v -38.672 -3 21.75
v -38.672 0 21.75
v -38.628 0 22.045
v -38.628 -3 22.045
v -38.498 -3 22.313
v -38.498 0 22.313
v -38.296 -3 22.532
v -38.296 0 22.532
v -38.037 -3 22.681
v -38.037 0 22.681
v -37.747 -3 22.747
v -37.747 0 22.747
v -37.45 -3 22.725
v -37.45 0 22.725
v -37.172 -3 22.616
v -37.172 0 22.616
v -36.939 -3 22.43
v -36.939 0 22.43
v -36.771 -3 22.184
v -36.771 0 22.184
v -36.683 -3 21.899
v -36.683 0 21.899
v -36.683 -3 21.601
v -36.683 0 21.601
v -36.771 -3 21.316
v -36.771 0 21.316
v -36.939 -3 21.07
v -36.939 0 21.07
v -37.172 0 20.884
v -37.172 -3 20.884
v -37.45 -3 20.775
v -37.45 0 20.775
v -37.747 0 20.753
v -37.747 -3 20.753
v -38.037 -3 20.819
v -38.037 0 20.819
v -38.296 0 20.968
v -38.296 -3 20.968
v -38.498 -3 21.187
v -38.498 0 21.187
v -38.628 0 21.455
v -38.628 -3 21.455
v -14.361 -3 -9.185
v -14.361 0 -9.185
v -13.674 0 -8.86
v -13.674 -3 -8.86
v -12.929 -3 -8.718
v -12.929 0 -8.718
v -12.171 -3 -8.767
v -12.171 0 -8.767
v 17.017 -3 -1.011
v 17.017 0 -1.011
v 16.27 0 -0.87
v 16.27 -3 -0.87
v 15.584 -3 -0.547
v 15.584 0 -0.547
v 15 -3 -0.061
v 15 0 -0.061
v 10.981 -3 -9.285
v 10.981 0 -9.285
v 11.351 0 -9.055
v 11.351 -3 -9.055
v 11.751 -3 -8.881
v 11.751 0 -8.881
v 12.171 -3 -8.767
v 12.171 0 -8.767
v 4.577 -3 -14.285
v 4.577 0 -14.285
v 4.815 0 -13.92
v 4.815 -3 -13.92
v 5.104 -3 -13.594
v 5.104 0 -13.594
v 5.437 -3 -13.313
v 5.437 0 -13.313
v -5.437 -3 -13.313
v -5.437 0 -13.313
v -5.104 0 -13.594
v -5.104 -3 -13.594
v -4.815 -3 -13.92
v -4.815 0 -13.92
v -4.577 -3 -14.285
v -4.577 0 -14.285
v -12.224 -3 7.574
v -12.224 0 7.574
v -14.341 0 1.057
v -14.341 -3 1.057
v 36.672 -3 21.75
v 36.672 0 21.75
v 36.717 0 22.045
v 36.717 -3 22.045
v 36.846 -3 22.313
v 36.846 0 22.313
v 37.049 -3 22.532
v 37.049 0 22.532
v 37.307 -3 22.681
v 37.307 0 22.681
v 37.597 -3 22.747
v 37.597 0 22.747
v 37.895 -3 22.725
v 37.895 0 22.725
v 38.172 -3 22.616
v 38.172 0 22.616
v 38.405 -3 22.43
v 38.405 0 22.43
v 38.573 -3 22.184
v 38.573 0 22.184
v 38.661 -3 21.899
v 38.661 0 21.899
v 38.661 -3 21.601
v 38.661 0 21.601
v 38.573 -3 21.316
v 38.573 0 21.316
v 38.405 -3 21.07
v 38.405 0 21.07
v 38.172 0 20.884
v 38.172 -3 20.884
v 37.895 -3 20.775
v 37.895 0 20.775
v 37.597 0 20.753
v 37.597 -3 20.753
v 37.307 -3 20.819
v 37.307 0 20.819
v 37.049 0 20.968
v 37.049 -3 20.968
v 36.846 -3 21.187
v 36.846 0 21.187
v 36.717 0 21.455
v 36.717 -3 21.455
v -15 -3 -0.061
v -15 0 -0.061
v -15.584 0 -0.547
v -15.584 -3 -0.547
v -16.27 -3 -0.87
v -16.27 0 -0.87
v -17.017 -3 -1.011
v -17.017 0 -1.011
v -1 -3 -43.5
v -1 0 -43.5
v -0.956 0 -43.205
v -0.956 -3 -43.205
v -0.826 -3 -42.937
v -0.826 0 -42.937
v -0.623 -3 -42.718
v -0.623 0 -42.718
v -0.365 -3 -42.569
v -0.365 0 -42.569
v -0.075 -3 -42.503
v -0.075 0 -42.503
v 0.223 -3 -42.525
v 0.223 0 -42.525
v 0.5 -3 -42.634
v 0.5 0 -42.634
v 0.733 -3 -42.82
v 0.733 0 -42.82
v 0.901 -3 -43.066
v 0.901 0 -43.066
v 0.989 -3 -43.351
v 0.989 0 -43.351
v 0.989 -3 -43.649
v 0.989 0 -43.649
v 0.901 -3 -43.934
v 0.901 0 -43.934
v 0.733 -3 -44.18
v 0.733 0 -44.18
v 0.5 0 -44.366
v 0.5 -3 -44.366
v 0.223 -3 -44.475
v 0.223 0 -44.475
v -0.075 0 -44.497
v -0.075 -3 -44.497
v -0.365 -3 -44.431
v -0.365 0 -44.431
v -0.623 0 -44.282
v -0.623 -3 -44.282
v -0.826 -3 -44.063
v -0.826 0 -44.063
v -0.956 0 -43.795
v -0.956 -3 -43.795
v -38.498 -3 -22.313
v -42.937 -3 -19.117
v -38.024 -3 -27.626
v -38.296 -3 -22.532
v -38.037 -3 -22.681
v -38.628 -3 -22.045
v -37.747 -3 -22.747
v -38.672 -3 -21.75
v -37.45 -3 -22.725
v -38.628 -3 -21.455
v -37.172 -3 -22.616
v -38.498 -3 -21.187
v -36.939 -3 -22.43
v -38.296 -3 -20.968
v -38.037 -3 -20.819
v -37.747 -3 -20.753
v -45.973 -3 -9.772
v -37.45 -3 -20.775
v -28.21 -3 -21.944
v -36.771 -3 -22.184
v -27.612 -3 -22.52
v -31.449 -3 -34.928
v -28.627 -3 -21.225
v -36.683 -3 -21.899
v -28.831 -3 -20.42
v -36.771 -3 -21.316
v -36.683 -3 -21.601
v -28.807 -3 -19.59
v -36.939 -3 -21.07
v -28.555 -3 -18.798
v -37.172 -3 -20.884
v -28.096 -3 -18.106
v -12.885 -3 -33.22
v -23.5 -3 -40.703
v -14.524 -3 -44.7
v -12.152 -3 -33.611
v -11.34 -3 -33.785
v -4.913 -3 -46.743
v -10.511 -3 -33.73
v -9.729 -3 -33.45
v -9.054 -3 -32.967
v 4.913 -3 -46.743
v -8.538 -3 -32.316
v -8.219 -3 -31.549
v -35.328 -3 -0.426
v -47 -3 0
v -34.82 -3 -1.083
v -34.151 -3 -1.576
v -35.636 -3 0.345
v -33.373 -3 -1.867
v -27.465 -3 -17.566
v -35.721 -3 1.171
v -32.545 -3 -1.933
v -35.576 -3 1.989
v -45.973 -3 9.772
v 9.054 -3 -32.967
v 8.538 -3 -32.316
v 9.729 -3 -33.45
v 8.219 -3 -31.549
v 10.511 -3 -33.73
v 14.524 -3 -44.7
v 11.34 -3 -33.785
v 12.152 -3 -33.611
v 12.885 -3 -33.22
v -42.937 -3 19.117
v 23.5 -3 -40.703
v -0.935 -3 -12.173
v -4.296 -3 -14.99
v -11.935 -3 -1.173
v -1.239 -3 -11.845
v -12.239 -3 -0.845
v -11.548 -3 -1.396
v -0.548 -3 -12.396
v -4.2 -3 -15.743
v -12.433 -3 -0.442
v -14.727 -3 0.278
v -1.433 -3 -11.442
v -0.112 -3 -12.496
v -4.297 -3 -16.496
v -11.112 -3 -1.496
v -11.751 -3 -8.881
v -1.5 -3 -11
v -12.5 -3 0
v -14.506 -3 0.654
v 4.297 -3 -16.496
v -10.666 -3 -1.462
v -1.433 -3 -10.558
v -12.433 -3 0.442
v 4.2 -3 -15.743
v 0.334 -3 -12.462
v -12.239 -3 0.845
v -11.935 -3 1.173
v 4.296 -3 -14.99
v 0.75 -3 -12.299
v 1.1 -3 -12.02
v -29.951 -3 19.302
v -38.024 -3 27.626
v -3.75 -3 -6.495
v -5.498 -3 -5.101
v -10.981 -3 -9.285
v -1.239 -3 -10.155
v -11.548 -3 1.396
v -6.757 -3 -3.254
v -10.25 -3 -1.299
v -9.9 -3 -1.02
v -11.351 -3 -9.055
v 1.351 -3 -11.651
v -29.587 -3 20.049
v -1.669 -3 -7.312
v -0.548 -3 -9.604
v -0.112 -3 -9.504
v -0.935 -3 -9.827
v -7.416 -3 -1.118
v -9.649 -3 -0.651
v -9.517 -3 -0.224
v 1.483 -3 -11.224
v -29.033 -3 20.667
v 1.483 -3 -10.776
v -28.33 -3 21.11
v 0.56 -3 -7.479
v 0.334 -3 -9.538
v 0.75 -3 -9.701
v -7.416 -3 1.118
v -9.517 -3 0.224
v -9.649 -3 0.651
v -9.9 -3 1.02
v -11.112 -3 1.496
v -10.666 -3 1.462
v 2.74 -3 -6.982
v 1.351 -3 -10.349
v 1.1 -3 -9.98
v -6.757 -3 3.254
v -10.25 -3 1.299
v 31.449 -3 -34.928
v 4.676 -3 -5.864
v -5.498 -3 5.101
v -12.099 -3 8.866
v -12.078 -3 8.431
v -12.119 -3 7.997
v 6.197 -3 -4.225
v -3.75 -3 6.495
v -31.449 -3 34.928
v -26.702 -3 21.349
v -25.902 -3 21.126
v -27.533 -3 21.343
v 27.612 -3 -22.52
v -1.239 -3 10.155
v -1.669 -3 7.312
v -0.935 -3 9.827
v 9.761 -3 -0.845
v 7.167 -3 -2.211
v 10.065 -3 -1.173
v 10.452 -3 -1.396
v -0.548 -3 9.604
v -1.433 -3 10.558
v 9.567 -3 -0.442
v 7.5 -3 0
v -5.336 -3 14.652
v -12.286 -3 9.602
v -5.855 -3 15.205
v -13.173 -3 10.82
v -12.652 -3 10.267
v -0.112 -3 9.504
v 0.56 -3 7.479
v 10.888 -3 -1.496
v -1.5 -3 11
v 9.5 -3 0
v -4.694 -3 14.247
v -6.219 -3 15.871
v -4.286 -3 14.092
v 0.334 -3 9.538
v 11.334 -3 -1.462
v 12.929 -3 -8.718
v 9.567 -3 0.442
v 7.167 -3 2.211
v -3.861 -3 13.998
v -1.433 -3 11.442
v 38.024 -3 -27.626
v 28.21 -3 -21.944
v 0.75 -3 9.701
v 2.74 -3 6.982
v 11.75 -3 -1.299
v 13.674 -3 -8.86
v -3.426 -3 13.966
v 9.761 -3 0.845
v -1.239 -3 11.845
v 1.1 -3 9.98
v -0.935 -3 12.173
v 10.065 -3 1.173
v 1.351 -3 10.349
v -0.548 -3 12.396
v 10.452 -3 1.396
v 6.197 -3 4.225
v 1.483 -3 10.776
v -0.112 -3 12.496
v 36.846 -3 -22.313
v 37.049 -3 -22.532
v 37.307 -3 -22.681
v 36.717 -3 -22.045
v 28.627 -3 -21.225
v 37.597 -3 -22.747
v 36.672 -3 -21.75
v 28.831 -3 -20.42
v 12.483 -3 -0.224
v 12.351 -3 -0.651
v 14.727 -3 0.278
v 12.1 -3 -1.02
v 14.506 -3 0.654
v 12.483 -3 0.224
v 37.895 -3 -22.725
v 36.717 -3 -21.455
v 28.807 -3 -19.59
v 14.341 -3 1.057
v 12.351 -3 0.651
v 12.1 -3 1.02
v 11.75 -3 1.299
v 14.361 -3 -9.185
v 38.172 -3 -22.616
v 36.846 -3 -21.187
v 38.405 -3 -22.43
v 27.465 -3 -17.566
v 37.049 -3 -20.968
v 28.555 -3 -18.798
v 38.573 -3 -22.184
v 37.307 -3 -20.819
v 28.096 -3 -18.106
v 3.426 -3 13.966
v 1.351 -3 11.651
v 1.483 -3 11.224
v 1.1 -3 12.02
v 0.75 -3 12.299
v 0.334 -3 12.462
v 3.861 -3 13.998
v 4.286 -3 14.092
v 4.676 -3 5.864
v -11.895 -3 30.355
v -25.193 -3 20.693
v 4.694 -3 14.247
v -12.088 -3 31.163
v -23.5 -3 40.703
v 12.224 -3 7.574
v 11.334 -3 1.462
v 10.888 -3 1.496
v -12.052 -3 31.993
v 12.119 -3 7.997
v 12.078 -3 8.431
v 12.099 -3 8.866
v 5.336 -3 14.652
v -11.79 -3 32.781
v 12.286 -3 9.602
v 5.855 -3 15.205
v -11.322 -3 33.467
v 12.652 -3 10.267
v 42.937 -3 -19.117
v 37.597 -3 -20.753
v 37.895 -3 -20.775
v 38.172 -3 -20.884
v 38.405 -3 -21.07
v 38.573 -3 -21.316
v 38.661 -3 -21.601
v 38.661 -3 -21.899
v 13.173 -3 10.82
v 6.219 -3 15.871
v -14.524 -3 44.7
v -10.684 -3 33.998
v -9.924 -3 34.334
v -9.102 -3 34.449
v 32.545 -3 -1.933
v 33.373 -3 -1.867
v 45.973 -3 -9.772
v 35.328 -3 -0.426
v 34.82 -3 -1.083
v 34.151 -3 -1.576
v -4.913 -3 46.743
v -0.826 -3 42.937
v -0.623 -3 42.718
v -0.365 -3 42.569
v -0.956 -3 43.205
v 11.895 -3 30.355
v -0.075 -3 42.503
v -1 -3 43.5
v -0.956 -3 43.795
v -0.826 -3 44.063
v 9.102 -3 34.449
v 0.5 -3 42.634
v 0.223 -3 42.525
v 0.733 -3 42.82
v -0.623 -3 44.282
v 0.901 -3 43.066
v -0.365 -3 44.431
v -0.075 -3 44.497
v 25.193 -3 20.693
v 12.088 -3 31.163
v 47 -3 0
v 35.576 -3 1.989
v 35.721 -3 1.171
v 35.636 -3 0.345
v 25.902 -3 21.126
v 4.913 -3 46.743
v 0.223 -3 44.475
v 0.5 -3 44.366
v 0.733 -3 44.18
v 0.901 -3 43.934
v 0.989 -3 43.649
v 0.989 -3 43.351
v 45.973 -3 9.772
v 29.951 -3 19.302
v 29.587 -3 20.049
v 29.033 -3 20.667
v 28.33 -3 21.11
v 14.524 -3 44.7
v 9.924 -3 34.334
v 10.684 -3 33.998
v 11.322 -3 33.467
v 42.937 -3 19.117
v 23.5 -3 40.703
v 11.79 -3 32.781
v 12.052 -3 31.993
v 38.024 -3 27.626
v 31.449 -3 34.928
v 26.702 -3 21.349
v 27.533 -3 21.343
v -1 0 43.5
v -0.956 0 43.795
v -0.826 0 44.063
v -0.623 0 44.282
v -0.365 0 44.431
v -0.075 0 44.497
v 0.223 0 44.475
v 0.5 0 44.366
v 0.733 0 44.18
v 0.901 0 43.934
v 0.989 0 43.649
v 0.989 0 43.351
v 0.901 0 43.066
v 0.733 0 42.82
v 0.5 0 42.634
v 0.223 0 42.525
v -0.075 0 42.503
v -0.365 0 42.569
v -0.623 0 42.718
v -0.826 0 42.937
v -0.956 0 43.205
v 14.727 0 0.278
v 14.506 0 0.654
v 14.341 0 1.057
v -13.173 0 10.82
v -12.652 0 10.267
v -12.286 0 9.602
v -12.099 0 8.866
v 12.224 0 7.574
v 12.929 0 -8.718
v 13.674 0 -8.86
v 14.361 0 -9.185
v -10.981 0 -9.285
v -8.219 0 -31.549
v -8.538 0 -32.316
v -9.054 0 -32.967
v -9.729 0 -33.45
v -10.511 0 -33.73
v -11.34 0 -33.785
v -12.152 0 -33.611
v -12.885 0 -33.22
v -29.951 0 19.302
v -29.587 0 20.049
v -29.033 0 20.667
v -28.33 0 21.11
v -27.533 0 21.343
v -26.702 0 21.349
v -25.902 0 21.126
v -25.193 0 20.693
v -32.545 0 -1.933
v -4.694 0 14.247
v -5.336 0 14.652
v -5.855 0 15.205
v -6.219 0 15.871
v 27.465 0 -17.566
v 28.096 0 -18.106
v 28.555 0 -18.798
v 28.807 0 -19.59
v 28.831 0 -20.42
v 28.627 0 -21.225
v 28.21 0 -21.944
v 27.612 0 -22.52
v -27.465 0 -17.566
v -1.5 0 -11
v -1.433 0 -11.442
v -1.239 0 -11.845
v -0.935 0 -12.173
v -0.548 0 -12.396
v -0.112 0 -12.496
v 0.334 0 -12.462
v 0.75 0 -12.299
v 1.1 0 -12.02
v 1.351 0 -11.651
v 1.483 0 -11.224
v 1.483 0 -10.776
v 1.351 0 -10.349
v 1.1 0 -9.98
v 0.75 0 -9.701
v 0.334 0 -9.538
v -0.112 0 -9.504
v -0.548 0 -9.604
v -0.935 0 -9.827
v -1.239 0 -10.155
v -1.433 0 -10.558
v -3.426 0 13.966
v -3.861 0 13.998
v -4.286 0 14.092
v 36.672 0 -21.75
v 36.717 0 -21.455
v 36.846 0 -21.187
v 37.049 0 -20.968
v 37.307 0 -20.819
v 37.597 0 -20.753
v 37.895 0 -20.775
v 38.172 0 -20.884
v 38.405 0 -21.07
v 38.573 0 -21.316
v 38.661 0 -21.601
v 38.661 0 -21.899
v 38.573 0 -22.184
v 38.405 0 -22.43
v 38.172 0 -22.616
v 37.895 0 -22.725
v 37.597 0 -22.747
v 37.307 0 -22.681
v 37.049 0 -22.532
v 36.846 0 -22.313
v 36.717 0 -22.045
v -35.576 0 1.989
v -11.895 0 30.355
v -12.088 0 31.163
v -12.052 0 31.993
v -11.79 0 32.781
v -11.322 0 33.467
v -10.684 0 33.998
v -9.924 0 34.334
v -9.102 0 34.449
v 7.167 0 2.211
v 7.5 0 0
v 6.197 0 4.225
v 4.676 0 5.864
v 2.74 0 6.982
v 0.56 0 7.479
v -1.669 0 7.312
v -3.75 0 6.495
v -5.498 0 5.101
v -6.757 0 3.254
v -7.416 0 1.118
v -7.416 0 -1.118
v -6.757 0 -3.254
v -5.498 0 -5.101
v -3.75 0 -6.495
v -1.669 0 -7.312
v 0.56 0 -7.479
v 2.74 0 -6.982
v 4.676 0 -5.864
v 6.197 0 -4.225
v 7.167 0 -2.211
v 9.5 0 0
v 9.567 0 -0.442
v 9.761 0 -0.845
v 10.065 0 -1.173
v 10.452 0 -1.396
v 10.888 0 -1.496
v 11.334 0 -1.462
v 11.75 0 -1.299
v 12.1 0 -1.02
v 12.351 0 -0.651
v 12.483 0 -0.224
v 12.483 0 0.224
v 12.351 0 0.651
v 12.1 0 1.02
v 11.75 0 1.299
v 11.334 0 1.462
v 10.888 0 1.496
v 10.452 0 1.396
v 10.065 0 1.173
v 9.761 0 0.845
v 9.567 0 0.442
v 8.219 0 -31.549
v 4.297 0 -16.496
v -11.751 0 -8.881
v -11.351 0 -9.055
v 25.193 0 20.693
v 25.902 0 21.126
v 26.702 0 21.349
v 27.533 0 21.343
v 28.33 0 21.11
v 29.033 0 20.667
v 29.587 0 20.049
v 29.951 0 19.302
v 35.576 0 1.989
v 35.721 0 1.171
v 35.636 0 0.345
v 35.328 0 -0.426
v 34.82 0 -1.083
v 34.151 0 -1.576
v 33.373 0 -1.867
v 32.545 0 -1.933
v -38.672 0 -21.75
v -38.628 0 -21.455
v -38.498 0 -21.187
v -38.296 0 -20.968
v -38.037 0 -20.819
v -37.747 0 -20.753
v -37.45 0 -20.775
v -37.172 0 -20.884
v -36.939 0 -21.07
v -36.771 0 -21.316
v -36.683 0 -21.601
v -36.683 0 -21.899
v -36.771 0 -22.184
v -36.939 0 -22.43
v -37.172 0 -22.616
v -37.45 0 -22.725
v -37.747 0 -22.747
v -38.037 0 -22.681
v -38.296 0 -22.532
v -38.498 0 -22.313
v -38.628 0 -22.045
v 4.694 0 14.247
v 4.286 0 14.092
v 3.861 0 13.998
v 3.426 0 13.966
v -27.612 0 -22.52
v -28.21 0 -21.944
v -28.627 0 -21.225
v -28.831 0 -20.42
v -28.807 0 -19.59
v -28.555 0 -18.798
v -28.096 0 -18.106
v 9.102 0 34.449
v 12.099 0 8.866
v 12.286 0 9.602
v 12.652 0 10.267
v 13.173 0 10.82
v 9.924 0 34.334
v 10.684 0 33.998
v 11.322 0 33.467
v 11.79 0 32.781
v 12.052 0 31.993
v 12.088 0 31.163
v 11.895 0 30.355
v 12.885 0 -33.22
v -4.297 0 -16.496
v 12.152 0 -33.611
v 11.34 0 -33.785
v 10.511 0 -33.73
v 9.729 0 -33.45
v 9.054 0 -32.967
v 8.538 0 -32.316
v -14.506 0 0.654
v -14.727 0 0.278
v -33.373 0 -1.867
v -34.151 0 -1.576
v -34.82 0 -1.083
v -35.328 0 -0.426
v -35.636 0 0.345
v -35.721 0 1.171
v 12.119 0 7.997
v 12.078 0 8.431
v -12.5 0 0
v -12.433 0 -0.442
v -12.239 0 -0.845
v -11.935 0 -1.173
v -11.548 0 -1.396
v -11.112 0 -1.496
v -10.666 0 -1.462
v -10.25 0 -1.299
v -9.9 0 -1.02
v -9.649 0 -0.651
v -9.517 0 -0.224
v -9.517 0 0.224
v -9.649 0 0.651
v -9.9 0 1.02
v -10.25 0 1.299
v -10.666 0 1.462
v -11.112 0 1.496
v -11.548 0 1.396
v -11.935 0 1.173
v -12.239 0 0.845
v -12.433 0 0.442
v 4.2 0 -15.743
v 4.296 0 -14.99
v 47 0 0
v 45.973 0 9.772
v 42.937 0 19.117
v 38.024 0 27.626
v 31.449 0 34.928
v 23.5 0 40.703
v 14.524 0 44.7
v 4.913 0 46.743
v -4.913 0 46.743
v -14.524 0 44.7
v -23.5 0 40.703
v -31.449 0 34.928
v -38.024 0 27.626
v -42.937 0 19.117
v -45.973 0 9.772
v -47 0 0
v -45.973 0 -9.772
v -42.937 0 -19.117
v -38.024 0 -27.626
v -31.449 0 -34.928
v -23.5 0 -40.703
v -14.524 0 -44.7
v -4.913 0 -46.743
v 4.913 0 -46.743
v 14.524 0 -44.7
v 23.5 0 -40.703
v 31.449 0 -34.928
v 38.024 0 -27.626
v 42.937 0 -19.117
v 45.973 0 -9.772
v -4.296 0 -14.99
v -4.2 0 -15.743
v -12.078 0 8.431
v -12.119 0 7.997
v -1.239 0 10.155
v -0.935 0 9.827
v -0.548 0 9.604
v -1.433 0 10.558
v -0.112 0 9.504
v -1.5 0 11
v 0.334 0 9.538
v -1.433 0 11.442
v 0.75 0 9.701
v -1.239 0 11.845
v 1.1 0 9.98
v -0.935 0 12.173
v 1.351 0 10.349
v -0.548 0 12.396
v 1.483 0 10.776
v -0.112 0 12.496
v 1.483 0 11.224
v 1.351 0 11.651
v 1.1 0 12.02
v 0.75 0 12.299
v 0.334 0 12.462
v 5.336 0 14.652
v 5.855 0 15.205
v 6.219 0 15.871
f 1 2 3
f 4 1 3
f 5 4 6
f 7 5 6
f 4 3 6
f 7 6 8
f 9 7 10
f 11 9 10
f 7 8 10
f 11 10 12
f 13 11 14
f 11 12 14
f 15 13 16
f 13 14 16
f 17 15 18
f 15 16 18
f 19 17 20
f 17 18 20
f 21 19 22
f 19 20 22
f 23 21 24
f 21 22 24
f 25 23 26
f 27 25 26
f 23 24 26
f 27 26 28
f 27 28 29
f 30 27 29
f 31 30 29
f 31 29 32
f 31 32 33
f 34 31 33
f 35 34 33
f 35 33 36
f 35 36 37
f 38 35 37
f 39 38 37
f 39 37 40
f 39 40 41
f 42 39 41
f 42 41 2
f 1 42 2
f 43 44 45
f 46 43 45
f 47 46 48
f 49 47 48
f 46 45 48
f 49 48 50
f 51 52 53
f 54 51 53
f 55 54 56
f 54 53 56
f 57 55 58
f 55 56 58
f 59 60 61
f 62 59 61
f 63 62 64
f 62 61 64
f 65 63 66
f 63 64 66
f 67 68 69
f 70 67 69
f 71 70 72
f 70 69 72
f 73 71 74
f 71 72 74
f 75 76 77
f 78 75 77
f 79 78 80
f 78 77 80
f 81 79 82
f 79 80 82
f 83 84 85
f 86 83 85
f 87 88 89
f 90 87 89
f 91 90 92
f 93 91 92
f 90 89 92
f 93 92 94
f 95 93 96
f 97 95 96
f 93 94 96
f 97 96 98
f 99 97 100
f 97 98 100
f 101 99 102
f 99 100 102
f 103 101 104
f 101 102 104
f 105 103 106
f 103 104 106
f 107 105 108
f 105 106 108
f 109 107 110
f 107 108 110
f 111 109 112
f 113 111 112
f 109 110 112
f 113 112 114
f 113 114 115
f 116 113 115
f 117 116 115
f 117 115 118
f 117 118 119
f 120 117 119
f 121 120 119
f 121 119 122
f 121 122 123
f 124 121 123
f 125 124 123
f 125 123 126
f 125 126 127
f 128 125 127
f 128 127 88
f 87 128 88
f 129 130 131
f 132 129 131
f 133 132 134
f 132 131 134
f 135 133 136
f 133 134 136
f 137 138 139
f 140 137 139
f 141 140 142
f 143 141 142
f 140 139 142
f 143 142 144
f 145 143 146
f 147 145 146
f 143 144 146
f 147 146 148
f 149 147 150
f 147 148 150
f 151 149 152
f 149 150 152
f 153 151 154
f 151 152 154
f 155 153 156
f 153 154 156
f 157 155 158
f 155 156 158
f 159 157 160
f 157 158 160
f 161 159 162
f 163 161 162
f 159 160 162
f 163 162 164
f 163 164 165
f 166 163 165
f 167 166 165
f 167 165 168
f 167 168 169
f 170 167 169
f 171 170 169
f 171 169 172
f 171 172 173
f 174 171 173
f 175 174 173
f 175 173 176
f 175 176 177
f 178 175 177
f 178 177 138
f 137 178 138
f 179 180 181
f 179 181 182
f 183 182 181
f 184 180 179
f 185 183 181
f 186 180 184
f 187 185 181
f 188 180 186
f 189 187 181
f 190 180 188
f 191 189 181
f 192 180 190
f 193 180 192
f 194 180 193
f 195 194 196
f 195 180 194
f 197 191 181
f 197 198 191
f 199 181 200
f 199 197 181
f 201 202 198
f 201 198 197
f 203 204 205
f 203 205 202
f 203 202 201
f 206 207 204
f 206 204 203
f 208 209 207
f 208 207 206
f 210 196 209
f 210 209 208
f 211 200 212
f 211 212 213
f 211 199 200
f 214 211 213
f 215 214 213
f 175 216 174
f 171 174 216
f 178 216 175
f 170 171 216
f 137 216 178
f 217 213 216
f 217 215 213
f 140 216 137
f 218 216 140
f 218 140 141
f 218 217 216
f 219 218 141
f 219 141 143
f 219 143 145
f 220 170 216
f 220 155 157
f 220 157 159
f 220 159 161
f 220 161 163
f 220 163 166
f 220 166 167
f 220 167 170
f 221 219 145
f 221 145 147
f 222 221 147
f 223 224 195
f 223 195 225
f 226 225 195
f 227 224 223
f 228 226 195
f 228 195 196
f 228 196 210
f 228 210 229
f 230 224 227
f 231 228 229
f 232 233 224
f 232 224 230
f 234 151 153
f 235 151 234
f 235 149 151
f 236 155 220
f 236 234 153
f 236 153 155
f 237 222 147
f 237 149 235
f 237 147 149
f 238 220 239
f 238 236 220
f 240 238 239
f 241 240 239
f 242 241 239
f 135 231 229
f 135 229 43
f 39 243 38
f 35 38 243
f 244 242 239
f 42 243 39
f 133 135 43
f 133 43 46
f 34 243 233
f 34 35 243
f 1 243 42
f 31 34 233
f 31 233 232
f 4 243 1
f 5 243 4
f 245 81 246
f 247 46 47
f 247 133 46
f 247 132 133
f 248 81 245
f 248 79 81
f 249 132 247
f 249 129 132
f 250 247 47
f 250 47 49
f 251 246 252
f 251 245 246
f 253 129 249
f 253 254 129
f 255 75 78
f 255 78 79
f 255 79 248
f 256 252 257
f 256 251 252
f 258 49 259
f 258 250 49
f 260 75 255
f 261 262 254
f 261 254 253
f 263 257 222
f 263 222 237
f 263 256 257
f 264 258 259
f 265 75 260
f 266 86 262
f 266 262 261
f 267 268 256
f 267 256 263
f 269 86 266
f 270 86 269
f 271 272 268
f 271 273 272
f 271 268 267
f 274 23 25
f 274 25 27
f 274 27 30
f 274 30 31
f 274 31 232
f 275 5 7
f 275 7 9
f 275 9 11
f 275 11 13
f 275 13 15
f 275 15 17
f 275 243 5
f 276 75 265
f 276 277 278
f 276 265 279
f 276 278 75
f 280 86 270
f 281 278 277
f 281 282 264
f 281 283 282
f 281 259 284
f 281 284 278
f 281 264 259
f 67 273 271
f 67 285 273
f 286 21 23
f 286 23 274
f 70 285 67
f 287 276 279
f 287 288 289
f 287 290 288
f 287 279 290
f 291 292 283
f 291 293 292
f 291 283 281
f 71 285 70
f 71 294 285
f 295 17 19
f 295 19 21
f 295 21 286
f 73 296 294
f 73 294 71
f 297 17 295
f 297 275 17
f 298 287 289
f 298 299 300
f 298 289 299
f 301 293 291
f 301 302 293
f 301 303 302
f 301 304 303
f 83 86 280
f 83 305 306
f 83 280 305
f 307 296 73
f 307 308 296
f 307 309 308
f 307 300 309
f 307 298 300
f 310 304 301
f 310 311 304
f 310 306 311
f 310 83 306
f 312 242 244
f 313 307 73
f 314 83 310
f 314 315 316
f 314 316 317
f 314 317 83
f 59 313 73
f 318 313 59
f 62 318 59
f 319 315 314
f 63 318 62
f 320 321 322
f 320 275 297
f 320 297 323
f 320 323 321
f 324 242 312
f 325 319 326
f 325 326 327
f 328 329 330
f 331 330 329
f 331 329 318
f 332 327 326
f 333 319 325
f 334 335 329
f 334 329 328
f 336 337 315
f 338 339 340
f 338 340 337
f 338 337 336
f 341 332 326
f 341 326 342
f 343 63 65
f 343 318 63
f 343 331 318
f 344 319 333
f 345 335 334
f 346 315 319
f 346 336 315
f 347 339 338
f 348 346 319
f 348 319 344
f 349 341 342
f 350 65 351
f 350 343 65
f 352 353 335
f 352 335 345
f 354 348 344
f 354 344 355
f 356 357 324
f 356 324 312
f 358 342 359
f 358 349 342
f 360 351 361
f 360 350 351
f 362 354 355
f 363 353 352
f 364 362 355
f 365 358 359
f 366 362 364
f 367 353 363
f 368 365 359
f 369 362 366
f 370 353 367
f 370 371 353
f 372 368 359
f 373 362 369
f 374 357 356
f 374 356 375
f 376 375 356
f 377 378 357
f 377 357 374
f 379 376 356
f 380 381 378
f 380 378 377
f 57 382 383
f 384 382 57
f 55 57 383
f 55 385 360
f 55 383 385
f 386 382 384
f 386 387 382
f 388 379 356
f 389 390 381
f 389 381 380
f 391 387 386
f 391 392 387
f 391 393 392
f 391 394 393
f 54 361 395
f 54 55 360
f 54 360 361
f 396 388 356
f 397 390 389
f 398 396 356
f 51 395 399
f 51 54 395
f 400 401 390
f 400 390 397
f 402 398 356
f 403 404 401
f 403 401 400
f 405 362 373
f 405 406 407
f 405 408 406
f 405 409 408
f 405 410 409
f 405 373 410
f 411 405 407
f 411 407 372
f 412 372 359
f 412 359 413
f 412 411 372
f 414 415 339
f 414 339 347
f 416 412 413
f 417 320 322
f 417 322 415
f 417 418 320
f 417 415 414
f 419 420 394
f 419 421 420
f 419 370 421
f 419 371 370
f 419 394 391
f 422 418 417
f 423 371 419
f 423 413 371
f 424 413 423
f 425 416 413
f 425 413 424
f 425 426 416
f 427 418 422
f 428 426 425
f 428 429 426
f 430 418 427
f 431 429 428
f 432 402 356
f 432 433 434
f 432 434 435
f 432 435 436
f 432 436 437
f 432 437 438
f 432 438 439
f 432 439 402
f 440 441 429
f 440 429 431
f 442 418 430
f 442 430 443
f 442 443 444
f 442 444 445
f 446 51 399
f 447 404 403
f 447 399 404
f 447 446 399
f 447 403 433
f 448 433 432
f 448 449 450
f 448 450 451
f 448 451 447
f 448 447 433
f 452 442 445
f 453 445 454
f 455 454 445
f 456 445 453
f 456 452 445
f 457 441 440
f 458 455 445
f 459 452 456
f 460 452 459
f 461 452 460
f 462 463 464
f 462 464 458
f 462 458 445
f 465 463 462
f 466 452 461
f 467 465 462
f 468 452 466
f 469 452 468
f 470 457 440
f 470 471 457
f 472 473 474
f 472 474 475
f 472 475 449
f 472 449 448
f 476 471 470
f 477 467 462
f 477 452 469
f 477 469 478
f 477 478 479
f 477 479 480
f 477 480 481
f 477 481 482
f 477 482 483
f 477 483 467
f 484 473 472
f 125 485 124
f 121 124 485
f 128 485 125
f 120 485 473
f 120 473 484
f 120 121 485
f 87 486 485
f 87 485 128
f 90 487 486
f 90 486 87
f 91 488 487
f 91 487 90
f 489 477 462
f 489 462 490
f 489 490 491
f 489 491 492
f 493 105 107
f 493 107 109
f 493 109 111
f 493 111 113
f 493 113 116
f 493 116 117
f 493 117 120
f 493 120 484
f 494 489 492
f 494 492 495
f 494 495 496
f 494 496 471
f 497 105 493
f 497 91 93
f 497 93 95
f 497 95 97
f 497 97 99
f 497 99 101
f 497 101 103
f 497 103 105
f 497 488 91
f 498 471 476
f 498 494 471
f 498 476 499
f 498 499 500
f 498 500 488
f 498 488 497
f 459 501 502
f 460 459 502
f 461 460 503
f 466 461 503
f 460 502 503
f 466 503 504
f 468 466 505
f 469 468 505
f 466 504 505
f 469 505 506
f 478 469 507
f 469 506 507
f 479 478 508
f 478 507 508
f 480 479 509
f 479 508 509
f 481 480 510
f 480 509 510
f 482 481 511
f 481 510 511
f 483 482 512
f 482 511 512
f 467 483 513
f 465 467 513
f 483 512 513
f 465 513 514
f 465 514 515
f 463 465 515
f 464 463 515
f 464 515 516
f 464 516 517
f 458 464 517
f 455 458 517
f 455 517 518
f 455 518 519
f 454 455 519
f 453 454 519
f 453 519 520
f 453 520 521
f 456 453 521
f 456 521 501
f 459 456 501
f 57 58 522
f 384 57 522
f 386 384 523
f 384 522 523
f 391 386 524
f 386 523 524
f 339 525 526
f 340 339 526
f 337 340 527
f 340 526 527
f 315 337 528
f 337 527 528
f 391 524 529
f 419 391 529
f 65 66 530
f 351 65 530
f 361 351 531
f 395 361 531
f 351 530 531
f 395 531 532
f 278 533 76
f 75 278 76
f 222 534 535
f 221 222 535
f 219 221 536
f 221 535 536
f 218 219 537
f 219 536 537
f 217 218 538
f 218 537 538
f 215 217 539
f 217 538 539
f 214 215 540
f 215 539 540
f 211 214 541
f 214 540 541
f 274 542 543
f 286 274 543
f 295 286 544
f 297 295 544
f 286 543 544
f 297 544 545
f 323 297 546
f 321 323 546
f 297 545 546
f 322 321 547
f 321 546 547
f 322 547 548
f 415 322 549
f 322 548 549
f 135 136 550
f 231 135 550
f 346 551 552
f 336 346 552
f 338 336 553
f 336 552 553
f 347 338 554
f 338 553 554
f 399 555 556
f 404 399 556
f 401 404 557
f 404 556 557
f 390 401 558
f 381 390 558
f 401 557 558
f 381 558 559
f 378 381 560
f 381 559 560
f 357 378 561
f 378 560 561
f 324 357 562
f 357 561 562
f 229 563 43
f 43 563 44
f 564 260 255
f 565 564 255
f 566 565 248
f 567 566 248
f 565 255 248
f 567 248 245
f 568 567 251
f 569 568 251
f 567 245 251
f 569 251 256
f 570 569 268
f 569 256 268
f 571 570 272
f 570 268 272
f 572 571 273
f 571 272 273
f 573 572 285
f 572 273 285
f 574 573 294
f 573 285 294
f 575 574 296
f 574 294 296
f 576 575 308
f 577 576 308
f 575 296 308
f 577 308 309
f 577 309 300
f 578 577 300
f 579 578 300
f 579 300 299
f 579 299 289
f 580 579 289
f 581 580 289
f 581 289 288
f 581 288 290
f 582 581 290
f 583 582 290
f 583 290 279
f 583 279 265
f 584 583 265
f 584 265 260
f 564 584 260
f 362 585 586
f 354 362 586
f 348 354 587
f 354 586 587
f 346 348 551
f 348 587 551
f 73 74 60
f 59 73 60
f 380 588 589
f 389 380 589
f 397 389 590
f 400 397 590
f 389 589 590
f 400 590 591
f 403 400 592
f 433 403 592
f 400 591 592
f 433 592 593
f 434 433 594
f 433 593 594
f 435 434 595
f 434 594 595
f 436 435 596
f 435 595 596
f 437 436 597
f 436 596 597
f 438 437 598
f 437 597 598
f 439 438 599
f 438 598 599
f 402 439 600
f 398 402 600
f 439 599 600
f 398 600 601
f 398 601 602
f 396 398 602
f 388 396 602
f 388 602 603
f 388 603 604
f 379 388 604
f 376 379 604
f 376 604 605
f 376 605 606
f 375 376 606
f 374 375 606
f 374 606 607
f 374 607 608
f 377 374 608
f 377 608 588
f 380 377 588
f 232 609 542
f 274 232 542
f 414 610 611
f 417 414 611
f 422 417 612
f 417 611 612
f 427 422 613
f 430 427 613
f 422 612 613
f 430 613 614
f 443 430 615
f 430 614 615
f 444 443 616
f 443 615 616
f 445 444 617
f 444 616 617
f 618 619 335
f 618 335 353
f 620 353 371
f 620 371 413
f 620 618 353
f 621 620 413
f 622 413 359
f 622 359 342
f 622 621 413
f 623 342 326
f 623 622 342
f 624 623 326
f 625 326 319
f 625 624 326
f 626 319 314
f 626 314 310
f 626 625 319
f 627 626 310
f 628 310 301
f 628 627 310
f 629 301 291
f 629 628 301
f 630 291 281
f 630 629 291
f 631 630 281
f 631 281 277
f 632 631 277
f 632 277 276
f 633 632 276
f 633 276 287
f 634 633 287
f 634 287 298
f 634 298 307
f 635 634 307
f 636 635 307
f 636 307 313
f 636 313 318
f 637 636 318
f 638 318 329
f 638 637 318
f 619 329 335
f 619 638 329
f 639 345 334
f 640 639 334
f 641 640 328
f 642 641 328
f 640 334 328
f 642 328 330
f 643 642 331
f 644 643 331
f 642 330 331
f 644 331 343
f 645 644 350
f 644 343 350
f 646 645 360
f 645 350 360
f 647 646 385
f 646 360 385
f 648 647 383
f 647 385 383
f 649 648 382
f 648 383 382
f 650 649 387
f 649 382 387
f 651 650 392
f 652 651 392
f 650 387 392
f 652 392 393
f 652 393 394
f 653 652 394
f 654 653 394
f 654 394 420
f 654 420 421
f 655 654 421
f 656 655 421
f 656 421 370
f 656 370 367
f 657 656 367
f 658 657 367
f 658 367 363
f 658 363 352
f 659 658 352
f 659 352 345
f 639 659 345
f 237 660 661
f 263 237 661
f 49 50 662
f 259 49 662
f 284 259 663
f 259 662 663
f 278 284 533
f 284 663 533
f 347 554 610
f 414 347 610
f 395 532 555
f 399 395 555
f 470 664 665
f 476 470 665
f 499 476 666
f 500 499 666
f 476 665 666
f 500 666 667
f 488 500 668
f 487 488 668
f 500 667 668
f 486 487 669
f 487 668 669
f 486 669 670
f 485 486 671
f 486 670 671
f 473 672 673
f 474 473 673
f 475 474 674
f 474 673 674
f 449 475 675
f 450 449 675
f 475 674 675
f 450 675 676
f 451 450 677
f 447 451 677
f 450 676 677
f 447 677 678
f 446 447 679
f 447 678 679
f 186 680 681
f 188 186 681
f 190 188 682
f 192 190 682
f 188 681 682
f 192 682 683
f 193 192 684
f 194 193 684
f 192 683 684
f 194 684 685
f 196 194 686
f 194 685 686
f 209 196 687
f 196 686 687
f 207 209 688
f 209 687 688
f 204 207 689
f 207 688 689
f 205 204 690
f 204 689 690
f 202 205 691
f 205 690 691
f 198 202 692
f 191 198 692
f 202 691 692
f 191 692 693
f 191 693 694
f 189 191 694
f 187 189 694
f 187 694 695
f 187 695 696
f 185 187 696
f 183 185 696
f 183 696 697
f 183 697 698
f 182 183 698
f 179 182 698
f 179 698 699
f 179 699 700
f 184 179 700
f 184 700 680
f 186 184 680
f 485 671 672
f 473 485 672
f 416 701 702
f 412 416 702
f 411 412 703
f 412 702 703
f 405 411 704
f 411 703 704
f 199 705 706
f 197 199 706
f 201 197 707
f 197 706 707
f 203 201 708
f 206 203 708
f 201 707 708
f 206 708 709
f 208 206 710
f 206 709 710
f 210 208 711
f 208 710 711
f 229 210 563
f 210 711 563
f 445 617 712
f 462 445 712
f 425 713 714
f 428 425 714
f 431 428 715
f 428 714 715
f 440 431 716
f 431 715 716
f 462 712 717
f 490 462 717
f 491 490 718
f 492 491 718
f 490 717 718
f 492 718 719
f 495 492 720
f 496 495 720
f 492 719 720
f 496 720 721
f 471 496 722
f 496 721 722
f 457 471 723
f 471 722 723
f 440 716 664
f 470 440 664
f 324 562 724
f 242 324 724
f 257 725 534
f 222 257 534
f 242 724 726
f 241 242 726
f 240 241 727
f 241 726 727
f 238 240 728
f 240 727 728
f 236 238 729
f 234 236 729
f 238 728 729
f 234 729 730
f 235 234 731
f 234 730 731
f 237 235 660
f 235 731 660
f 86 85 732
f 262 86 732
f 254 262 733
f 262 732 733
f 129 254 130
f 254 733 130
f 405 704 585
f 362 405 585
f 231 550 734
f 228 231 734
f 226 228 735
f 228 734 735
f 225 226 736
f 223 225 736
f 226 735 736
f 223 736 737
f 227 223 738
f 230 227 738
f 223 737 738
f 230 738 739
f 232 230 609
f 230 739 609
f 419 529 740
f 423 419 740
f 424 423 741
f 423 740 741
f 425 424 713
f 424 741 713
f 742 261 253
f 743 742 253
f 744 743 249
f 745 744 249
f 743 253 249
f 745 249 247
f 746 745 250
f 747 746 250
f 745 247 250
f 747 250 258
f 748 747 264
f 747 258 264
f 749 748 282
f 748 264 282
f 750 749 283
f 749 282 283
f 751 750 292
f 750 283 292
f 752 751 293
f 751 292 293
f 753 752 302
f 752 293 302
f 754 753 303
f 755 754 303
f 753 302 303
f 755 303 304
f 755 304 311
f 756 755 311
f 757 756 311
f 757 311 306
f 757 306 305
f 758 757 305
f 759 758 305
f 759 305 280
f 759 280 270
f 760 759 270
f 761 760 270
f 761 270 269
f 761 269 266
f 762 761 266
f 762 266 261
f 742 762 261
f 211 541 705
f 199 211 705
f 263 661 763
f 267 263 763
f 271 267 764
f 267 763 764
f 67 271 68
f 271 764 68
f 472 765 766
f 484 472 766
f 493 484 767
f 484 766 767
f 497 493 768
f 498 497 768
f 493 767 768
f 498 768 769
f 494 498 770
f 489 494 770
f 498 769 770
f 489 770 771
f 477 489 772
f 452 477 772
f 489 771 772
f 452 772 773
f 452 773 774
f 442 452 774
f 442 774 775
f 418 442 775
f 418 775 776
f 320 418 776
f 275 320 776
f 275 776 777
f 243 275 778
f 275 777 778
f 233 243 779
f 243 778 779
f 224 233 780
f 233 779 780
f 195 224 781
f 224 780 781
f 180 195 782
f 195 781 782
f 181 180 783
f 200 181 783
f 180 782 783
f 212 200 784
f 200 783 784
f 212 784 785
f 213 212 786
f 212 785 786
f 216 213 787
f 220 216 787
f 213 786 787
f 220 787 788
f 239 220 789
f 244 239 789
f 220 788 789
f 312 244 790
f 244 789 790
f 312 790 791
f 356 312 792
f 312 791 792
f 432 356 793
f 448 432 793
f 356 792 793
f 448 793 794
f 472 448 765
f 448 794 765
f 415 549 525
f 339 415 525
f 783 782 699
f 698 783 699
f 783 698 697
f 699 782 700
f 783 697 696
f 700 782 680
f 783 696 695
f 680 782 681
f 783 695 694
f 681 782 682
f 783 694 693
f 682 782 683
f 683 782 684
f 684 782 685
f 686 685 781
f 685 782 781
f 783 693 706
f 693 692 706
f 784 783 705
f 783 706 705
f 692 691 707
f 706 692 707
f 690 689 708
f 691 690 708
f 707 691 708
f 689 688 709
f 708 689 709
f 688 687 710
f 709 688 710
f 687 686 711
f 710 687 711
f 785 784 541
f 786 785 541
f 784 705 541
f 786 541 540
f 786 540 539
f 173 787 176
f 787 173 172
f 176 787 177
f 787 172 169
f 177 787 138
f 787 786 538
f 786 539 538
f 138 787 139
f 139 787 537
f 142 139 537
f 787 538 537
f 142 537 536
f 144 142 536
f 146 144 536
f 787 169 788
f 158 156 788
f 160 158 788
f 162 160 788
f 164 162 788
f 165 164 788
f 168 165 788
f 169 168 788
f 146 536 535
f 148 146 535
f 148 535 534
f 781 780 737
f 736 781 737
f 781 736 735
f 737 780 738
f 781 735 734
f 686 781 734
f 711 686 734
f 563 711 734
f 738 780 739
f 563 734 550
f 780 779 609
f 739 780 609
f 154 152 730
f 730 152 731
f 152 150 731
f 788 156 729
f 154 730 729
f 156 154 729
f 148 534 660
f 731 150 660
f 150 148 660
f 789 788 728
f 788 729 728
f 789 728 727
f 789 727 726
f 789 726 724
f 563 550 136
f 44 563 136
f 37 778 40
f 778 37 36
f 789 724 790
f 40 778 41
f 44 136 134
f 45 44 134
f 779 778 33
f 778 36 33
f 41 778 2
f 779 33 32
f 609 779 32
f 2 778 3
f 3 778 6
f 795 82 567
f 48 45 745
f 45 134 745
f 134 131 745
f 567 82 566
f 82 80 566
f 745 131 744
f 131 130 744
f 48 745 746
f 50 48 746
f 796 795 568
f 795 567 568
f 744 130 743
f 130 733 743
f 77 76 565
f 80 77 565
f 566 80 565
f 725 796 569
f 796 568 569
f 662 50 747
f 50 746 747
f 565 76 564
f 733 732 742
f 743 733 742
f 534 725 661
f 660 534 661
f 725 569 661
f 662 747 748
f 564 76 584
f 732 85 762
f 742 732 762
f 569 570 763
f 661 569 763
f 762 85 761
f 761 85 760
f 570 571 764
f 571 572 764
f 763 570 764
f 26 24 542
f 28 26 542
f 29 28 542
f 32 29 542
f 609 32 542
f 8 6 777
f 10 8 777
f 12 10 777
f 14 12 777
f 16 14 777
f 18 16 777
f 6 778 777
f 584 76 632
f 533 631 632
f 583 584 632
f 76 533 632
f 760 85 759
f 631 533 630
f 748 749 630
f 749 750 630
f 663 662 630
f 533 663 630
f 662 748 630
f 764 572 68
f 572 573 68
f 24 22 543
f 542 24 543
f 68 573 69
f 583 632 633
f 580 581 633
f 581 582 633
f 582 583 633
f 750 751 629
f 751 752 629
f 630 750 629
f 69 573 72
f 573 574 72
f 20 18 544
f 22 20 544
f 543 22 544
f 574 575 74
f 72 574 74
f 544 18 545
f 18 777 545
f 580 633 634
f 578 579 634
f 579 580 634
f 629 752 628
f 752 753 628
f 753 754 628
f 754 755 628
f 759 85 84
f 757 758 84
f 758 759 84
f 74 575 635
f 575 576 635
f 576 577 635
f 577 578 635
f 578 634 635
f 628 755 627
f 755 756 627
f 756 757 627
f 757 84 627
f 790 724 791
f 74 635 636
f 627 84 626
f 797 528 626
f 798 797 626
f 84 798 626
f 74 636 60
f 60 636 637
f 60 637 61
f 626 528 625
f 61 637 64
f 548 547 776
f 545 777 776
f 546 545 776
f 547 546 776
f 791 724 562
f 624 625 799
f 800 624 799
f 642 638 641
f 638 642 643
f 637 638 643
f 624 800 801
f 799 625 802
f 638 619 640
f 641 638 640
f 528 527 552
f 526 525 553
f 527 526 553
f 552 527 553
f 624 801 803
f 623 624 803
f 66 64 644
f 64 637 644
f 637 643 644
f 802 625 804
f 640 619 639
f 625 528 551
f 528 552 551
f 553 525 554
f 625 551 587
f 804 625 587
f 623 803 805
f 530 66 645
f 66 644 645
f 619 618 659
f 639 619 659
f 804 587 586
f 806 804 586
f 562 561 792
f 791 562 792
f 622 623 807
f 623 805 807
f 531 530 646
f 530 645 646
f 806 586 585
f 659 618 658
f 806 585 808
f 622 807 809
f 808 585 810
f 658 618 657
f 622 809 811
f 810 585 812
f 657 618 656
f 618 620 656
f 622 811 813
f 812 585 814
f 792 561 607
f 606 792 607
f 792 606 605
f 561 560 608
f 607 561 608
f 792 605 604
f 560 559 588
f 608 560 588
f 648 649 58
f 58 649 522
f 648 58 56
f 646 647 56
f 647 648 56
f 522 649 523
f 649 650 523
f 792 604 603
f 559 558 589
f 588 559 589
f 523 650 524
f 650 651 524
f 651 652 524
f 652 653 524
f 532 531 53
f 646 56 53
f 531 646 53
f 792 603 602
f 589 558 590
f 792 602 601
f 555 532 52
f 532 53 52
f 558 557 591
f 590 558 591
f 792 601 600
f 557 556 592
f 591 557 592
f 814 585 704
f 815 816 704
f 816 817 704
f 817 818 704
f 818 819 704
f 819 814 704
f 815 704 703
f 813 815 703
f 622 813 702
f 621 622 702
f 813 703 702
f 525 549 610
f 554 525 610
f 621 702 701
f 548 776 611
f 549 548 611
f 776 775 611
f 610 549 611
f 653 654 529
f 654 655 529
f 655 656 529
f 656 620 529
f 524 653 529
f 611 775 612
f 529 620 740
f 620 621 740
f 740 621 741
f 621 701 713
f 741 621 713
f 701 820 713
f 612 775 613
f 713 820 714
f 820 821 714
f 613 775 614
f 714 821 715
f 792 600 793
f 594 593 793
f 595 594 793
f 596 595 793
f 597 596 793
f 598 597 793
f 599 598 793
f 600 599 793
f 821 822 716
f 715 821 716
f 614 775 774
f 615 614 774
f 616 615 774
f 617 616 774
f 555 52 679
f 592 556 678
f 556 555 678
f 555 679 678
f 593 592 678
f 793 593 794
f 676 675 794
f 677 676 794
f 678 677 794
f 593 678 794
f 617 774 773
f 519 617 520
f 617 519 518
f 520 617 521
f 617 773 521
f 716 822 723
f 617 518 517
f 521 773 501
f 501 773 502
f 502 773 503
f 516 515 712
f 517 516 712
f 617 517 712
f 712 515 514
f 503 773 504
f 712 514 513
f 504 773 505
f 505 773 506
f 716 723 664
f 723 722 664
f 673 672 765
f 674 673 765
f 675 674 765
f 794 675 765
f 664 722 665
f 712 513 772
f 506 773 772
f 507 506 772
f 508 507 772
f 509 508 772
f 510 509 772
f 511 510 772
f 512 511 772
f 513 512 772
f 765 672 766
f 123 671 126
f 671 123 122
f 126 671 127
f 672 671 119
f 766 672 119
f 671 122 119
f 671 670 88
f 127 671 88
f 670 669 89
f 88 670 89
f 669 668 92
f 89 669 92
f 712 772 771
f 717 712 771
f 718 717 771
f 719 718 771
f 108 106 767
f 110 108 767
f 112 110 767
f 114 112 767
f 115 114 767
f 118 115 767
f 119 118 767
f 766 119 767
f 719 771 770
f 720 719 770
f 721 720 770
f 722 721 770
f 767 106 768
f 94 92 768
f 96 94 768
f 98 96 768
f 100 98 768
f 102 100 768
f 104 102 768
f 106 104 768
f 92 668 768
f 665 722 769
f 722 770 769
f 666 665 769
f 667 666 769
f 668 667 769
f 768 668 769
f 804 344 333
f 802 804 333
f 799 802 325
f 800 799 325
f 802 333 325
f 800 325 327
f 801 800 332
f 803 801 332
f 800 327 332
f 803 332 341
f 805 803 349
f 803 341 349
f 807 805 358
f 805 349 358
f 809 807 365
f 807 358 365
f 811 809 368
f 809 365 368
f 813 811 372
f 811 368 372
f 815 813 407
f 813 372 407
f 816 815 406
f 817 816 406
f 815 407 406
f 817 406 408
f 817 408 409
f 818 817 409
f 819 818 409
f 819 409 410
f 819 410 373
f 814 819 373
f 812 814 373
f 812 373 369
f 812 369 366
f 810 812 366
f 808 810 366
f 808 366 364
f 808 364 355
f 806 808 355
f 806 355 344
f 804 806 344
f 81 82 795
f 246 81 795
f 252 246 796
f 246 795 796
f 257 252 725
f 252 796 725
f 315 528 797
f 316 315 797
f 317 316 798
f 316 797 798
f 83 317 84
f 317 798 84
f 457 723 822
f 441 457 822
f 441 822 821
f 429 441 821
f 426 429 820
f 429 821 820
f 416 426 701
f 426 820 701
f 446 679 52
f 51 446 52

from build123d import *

# Parameters (mm, degrees)
F0_R     = 47
F0_R_2   = 7.5
F1_DEPTH = 3
F3_D     = 2
F5_D     = 3


with BuildPart() as f1:
    # F0 (on Front) → F1 (new body)
    with BuildSketch(Plane.XZ):
        Circle(F0_R)
        with BuildLine():
            ThreePointArc((13.499536, 34.44942), (30.565363, 20.850865), (37, 0))
            ThreePointArc((37, 0), (1.097165, -36.983729), (-36.934931, -2.193365))
            ThreePointArc((-36.934931, -2.193365), (-35.189091, 11.433629), (-28.591759, 23.484278))
            ThreePointArc((-28.591759, 23.484278), (-21.748054, 29.933629), (-13.499536, 34.44942))
            ThreePointArc((-13.499536, 34.44942), (-6.869187, 36.356764), (0, 37))
            ThreePointArc((0, 37), (6.869187, 36.356764), (13.499536, 34.44942))
        make_face(mode=Mode.SUBTRACT)
        with BuildLine():
            ThreePointArc((-36.934931, -2.193365), (1.097165, -36.983729), (37, 0))
            ThreePointArc((37, 0), (30.565363, 20.850865), (13.499536, 34.44942))
            ThreePointArc((13.499536, 34.44942), (6.869187, 36.356764), (0, 37))
            ThreePointArc((0, 37), (-6.869187, 36.356764), (-13.499536, 34.44942))
            ThreePointArc((-13.499536, 34.44942), (-21.748054, 29.933629), (-28.591759, 23.484278))
            ThreePointArc((-28.591759, 23.484278), (-35.189091, 11.433629), (-36.934931, -2.193365))
        make_face()
        with BuildLine():
            ThreePointArc((4.693528, 14.246782), (5.085095, 14.111761), (5.472785, 13.965981))
            ThreePointArc((5.472785, 13.965981), (8.816779, 12.135255), (11.591254, 9.520653))
            ThreePointArc((11.591254, 9.520653), (11.849702, 9.196987), (12.099115, 8.866309))
            ThreePointArc((12.099115, 8.866309), (12.447774, 9.946358), (13.172702, 10.8196))
            Line((13.172702, 10.8196), (25.193427, 20.693005))
            ThreePointArc((25.193427, 20.693005), (27.939595, 21.254159), (29.950727, 19.301805))
            Line((29.950727, 19.301805), (35.575964, 1.989107))
            ThreePointArc((35.575964, 1.989107), (35.096489, -0.772494), (32.544954, -1.932668))
            Line((32.544954, -1.932668), (17.016541, -1.01052))
            ThreePointArc((17.016541, -1.01052), (15.916783, -0.730155), (14.999875, -0.061313))
            ThreePointArc((14.999875, -0.061313), (14.265848, -4.635255), (12.171193, -8.767102))
            ThreePointArc((12.171193, -8.767102), (13.306123, -8.764943), (14.360639, -9.184544))
            Line((14.360639, -9.184544), (27.465415, -17.565883))
            ThreePointArc((27.465415, -17.565883), (28.847716, -20.004238), (27.612391, -22.520248))
            Line((27.612391, -22.520248), (12.885331, -33.220084))
            ThreePointArc((12.885331, -33.220084), (10.110726, -33.617458), (8.218867, -31.549318))
            Line((8.218867, -31.549318), (4.297339, -16.49596))
            ThreePointArc((4.297339, -16.49596), (4.224138, -15.363391), (4.576904, -14.284675))
            ThreePointArc((4.576904, -14.284675), (0, -15), (-4.576904, -14.284675))
            ThreePointArc((-4.576904, -14.284675), (-4.224138, -15.363391), (-4.297339, -16.49596))
            Line((-4.297339, -16.49596), (-8.218867, -31.549318))
            ThreePointArc((-8.218867, -31.549318), (-10.110726, -33.617458), (-12.885331, -33.220084))
            Line((-12.885331, -33.220084), (-27.612391, -22.520248))
            ThreePointArc((-27.612391, -22.520248), (-28.847716, -20.004238), (-27.465415, -17.565883))
            Line((-27.465415, -17.565883), (-14.360639, -9.184544))
            ThreePointArc((-14.360639, -9.184544), (-13.306123, -8.764943), (-12.171193, -8.767102))
            ThreePointArc((-12.171193, -8.767102), (-14.132429, -5.02737), (-14.973621, -0.889202))
            ThreePointArc((-14.973621, -0.889202), (-14.992463, -0.475439), (-14.999875, -0.061313))
            ThreePointArc((-14.999875, -0.061313), (-15.916783, -0.730155), (-17.016541, -1.01052))
            Line((-17.016541, -1.01052), (-32.544954, -1.932668))
            ThreePointArc((-32.544954, -1.932668), (-35.096489, -0.772494), (-35.575964, 1.989107))
            Line((-35.575964, 1.989107), (-29.950727, 19.301805))
            ThreePointArc((-29.950727, 19.301805), (-27.939595, 21.254159), (-25.193427, 20.693005))
            Line((-25.193427, 20.693005), (-13.172702, 10.8196))
            ThreePointArc((-13.172702, 10.8196), (-12.447774, 9.946358), (-12.099115, 8.866309))
            ThreePointArc((-12.099115, 8.866309), (-9.148474, 11.887196), (-5.472785, 13.965981))
            ThreePointArc((-5.472785, 13.965981), (-5.085095, 14.111761), (-4.693528, 14.246782))
            ThreePointArc((-4.693528, 14.246782), (-5.612975, 14.91213), (-6.219462, 15.871424))
            Line((-6.219462, 15.871424), (-11.89502, 30.354863))
            ThreePointArc((-11.89502, 30.354863), (-11.580097, 33.140031), (-9.101824, 34.44942))
            Line((-9.101824, 34.44942), (9.101824, 34.44942))
            ThreePointArc((9.101824, 34.44942), (11.580097, 33.140031), (11.89502, 30.354863))
            Line((11.89502, 30.354863), (6.219462, 15.871424))
            ThreePointArc((6.219462, 15.871424), (5.612975, 14.91213), (4.693528, 14.246782))
        make_face(mode=Mode.SUBTRACT)
        with BuildLine():
            ThreePointArc((11.591254, 9.520653), (8.816779, 12.135255), (5.472785, 13.965981))
            ThreePointArc((5.472785, 13.965981), (5.085095, 14.111761), (4.693528, 14.246782))
            ThreePointArc((4.693528, 14.246782), (4.075266, 14.037022), (3.426266, 13.965981))
            Line((3.426266, 13.965981), (-3.426266, 13.965981))
            ThreePointArc((-3.426266, 13.965981), (-4.075266, 14.037022), (-4.693528, 14.246782))
            ThreePointArc((-4.693528, 14.246782), (-5.085095, 14.111761), (-5.472785, 13.965981))
            ThreePointArc((-5.472785, 13.965981), (-9.148474, 11.887196), (-12.099115, 8.866309))
            ThreePointArc((-12.099115, 8.866309), (-12.090675, 8.213486), (-12.223663, 7.574298))
            Line((-12.223663, 7.574298), (-14.341212, 1.057153))
            ThreePointArc((-14.341212, 1.057153), (-14.609328, 0.46187), (-14.999875, -0.061313))
            ThreePointArc((-14.999875, -0.061313), (-14.992463, -0.475439), (-14.973621, -0.889202))
            ThreePointArc((-14.973621, -0.889202), (-14.132429, -5.02737), (-12.171193, -8.767102))
            ThreePointArc((-12.171193, -8.767102), (-11.547714, -8.960809), (-10.980905, -9.284808))
            Line((-10.980905, -9.284808), (-5.437091, -13.312624))
            ThreePointArc((-5.437091, -13.312624), (-4.953796, -13.751571), (-4.576904, -14.284675))
            ThreePointArc((-4.576904, -14.284675), (0, -15), (4.576904, -14.284675))
            ThreePointArc((4.576904, -14.284675), (4.953796, -13.751571), (5.437091, -13.312624))
            Line((5.437091, -13.312624), (10.980905, -9.284808))
            ThreePointArc((10.980905, -9.284808), (11.547714, -8.960809), (12.171193, -8.767102))
            ThreePointArc((12.171193, -8.767102), (14.265848, -4.635255), (14.999875, -0.061313))
            ThreePointArc((14.999875, -0.061313), (14.609328, 0.46187), (14.341212, 1.057153))
            Line((14.341212, 1.057153), (12.223663, 7.574298))
            ThreePointArc((12.223663, 7.574298), (12.090675, 8.213486), (12.099115, 8.866309))
            ThreePointArc((12.099115, 8.866309), (11.849702, 9.196987), (11.591254, 9.520653))
        make_face()
        Circle(F0_R_2, mode=Mode.SUBTRACT)
    extrude(amount=F1_DEPTH)

    # F3 (through all)
    with Locations(Plane.XZ.offset(3)):
        with Locations((37.672105, 21.75), (37.672105, -21.75), (0, -43.5), (-37.672105, -21.75), (-37.672105, 21.75), (0, 43.5)):
            Hole(F3_D / 2)

    # F5 (through all)
    with Locations(Plane(origin=(0, 0, 0), x_dir=(1, 0, 0), z_dir=(0, 1, 0))):
        with Locations((0, 11), (11, 0), (0, -11), (-11, 0)):
            Hole(F5_D / 2)


solid = f1.part
